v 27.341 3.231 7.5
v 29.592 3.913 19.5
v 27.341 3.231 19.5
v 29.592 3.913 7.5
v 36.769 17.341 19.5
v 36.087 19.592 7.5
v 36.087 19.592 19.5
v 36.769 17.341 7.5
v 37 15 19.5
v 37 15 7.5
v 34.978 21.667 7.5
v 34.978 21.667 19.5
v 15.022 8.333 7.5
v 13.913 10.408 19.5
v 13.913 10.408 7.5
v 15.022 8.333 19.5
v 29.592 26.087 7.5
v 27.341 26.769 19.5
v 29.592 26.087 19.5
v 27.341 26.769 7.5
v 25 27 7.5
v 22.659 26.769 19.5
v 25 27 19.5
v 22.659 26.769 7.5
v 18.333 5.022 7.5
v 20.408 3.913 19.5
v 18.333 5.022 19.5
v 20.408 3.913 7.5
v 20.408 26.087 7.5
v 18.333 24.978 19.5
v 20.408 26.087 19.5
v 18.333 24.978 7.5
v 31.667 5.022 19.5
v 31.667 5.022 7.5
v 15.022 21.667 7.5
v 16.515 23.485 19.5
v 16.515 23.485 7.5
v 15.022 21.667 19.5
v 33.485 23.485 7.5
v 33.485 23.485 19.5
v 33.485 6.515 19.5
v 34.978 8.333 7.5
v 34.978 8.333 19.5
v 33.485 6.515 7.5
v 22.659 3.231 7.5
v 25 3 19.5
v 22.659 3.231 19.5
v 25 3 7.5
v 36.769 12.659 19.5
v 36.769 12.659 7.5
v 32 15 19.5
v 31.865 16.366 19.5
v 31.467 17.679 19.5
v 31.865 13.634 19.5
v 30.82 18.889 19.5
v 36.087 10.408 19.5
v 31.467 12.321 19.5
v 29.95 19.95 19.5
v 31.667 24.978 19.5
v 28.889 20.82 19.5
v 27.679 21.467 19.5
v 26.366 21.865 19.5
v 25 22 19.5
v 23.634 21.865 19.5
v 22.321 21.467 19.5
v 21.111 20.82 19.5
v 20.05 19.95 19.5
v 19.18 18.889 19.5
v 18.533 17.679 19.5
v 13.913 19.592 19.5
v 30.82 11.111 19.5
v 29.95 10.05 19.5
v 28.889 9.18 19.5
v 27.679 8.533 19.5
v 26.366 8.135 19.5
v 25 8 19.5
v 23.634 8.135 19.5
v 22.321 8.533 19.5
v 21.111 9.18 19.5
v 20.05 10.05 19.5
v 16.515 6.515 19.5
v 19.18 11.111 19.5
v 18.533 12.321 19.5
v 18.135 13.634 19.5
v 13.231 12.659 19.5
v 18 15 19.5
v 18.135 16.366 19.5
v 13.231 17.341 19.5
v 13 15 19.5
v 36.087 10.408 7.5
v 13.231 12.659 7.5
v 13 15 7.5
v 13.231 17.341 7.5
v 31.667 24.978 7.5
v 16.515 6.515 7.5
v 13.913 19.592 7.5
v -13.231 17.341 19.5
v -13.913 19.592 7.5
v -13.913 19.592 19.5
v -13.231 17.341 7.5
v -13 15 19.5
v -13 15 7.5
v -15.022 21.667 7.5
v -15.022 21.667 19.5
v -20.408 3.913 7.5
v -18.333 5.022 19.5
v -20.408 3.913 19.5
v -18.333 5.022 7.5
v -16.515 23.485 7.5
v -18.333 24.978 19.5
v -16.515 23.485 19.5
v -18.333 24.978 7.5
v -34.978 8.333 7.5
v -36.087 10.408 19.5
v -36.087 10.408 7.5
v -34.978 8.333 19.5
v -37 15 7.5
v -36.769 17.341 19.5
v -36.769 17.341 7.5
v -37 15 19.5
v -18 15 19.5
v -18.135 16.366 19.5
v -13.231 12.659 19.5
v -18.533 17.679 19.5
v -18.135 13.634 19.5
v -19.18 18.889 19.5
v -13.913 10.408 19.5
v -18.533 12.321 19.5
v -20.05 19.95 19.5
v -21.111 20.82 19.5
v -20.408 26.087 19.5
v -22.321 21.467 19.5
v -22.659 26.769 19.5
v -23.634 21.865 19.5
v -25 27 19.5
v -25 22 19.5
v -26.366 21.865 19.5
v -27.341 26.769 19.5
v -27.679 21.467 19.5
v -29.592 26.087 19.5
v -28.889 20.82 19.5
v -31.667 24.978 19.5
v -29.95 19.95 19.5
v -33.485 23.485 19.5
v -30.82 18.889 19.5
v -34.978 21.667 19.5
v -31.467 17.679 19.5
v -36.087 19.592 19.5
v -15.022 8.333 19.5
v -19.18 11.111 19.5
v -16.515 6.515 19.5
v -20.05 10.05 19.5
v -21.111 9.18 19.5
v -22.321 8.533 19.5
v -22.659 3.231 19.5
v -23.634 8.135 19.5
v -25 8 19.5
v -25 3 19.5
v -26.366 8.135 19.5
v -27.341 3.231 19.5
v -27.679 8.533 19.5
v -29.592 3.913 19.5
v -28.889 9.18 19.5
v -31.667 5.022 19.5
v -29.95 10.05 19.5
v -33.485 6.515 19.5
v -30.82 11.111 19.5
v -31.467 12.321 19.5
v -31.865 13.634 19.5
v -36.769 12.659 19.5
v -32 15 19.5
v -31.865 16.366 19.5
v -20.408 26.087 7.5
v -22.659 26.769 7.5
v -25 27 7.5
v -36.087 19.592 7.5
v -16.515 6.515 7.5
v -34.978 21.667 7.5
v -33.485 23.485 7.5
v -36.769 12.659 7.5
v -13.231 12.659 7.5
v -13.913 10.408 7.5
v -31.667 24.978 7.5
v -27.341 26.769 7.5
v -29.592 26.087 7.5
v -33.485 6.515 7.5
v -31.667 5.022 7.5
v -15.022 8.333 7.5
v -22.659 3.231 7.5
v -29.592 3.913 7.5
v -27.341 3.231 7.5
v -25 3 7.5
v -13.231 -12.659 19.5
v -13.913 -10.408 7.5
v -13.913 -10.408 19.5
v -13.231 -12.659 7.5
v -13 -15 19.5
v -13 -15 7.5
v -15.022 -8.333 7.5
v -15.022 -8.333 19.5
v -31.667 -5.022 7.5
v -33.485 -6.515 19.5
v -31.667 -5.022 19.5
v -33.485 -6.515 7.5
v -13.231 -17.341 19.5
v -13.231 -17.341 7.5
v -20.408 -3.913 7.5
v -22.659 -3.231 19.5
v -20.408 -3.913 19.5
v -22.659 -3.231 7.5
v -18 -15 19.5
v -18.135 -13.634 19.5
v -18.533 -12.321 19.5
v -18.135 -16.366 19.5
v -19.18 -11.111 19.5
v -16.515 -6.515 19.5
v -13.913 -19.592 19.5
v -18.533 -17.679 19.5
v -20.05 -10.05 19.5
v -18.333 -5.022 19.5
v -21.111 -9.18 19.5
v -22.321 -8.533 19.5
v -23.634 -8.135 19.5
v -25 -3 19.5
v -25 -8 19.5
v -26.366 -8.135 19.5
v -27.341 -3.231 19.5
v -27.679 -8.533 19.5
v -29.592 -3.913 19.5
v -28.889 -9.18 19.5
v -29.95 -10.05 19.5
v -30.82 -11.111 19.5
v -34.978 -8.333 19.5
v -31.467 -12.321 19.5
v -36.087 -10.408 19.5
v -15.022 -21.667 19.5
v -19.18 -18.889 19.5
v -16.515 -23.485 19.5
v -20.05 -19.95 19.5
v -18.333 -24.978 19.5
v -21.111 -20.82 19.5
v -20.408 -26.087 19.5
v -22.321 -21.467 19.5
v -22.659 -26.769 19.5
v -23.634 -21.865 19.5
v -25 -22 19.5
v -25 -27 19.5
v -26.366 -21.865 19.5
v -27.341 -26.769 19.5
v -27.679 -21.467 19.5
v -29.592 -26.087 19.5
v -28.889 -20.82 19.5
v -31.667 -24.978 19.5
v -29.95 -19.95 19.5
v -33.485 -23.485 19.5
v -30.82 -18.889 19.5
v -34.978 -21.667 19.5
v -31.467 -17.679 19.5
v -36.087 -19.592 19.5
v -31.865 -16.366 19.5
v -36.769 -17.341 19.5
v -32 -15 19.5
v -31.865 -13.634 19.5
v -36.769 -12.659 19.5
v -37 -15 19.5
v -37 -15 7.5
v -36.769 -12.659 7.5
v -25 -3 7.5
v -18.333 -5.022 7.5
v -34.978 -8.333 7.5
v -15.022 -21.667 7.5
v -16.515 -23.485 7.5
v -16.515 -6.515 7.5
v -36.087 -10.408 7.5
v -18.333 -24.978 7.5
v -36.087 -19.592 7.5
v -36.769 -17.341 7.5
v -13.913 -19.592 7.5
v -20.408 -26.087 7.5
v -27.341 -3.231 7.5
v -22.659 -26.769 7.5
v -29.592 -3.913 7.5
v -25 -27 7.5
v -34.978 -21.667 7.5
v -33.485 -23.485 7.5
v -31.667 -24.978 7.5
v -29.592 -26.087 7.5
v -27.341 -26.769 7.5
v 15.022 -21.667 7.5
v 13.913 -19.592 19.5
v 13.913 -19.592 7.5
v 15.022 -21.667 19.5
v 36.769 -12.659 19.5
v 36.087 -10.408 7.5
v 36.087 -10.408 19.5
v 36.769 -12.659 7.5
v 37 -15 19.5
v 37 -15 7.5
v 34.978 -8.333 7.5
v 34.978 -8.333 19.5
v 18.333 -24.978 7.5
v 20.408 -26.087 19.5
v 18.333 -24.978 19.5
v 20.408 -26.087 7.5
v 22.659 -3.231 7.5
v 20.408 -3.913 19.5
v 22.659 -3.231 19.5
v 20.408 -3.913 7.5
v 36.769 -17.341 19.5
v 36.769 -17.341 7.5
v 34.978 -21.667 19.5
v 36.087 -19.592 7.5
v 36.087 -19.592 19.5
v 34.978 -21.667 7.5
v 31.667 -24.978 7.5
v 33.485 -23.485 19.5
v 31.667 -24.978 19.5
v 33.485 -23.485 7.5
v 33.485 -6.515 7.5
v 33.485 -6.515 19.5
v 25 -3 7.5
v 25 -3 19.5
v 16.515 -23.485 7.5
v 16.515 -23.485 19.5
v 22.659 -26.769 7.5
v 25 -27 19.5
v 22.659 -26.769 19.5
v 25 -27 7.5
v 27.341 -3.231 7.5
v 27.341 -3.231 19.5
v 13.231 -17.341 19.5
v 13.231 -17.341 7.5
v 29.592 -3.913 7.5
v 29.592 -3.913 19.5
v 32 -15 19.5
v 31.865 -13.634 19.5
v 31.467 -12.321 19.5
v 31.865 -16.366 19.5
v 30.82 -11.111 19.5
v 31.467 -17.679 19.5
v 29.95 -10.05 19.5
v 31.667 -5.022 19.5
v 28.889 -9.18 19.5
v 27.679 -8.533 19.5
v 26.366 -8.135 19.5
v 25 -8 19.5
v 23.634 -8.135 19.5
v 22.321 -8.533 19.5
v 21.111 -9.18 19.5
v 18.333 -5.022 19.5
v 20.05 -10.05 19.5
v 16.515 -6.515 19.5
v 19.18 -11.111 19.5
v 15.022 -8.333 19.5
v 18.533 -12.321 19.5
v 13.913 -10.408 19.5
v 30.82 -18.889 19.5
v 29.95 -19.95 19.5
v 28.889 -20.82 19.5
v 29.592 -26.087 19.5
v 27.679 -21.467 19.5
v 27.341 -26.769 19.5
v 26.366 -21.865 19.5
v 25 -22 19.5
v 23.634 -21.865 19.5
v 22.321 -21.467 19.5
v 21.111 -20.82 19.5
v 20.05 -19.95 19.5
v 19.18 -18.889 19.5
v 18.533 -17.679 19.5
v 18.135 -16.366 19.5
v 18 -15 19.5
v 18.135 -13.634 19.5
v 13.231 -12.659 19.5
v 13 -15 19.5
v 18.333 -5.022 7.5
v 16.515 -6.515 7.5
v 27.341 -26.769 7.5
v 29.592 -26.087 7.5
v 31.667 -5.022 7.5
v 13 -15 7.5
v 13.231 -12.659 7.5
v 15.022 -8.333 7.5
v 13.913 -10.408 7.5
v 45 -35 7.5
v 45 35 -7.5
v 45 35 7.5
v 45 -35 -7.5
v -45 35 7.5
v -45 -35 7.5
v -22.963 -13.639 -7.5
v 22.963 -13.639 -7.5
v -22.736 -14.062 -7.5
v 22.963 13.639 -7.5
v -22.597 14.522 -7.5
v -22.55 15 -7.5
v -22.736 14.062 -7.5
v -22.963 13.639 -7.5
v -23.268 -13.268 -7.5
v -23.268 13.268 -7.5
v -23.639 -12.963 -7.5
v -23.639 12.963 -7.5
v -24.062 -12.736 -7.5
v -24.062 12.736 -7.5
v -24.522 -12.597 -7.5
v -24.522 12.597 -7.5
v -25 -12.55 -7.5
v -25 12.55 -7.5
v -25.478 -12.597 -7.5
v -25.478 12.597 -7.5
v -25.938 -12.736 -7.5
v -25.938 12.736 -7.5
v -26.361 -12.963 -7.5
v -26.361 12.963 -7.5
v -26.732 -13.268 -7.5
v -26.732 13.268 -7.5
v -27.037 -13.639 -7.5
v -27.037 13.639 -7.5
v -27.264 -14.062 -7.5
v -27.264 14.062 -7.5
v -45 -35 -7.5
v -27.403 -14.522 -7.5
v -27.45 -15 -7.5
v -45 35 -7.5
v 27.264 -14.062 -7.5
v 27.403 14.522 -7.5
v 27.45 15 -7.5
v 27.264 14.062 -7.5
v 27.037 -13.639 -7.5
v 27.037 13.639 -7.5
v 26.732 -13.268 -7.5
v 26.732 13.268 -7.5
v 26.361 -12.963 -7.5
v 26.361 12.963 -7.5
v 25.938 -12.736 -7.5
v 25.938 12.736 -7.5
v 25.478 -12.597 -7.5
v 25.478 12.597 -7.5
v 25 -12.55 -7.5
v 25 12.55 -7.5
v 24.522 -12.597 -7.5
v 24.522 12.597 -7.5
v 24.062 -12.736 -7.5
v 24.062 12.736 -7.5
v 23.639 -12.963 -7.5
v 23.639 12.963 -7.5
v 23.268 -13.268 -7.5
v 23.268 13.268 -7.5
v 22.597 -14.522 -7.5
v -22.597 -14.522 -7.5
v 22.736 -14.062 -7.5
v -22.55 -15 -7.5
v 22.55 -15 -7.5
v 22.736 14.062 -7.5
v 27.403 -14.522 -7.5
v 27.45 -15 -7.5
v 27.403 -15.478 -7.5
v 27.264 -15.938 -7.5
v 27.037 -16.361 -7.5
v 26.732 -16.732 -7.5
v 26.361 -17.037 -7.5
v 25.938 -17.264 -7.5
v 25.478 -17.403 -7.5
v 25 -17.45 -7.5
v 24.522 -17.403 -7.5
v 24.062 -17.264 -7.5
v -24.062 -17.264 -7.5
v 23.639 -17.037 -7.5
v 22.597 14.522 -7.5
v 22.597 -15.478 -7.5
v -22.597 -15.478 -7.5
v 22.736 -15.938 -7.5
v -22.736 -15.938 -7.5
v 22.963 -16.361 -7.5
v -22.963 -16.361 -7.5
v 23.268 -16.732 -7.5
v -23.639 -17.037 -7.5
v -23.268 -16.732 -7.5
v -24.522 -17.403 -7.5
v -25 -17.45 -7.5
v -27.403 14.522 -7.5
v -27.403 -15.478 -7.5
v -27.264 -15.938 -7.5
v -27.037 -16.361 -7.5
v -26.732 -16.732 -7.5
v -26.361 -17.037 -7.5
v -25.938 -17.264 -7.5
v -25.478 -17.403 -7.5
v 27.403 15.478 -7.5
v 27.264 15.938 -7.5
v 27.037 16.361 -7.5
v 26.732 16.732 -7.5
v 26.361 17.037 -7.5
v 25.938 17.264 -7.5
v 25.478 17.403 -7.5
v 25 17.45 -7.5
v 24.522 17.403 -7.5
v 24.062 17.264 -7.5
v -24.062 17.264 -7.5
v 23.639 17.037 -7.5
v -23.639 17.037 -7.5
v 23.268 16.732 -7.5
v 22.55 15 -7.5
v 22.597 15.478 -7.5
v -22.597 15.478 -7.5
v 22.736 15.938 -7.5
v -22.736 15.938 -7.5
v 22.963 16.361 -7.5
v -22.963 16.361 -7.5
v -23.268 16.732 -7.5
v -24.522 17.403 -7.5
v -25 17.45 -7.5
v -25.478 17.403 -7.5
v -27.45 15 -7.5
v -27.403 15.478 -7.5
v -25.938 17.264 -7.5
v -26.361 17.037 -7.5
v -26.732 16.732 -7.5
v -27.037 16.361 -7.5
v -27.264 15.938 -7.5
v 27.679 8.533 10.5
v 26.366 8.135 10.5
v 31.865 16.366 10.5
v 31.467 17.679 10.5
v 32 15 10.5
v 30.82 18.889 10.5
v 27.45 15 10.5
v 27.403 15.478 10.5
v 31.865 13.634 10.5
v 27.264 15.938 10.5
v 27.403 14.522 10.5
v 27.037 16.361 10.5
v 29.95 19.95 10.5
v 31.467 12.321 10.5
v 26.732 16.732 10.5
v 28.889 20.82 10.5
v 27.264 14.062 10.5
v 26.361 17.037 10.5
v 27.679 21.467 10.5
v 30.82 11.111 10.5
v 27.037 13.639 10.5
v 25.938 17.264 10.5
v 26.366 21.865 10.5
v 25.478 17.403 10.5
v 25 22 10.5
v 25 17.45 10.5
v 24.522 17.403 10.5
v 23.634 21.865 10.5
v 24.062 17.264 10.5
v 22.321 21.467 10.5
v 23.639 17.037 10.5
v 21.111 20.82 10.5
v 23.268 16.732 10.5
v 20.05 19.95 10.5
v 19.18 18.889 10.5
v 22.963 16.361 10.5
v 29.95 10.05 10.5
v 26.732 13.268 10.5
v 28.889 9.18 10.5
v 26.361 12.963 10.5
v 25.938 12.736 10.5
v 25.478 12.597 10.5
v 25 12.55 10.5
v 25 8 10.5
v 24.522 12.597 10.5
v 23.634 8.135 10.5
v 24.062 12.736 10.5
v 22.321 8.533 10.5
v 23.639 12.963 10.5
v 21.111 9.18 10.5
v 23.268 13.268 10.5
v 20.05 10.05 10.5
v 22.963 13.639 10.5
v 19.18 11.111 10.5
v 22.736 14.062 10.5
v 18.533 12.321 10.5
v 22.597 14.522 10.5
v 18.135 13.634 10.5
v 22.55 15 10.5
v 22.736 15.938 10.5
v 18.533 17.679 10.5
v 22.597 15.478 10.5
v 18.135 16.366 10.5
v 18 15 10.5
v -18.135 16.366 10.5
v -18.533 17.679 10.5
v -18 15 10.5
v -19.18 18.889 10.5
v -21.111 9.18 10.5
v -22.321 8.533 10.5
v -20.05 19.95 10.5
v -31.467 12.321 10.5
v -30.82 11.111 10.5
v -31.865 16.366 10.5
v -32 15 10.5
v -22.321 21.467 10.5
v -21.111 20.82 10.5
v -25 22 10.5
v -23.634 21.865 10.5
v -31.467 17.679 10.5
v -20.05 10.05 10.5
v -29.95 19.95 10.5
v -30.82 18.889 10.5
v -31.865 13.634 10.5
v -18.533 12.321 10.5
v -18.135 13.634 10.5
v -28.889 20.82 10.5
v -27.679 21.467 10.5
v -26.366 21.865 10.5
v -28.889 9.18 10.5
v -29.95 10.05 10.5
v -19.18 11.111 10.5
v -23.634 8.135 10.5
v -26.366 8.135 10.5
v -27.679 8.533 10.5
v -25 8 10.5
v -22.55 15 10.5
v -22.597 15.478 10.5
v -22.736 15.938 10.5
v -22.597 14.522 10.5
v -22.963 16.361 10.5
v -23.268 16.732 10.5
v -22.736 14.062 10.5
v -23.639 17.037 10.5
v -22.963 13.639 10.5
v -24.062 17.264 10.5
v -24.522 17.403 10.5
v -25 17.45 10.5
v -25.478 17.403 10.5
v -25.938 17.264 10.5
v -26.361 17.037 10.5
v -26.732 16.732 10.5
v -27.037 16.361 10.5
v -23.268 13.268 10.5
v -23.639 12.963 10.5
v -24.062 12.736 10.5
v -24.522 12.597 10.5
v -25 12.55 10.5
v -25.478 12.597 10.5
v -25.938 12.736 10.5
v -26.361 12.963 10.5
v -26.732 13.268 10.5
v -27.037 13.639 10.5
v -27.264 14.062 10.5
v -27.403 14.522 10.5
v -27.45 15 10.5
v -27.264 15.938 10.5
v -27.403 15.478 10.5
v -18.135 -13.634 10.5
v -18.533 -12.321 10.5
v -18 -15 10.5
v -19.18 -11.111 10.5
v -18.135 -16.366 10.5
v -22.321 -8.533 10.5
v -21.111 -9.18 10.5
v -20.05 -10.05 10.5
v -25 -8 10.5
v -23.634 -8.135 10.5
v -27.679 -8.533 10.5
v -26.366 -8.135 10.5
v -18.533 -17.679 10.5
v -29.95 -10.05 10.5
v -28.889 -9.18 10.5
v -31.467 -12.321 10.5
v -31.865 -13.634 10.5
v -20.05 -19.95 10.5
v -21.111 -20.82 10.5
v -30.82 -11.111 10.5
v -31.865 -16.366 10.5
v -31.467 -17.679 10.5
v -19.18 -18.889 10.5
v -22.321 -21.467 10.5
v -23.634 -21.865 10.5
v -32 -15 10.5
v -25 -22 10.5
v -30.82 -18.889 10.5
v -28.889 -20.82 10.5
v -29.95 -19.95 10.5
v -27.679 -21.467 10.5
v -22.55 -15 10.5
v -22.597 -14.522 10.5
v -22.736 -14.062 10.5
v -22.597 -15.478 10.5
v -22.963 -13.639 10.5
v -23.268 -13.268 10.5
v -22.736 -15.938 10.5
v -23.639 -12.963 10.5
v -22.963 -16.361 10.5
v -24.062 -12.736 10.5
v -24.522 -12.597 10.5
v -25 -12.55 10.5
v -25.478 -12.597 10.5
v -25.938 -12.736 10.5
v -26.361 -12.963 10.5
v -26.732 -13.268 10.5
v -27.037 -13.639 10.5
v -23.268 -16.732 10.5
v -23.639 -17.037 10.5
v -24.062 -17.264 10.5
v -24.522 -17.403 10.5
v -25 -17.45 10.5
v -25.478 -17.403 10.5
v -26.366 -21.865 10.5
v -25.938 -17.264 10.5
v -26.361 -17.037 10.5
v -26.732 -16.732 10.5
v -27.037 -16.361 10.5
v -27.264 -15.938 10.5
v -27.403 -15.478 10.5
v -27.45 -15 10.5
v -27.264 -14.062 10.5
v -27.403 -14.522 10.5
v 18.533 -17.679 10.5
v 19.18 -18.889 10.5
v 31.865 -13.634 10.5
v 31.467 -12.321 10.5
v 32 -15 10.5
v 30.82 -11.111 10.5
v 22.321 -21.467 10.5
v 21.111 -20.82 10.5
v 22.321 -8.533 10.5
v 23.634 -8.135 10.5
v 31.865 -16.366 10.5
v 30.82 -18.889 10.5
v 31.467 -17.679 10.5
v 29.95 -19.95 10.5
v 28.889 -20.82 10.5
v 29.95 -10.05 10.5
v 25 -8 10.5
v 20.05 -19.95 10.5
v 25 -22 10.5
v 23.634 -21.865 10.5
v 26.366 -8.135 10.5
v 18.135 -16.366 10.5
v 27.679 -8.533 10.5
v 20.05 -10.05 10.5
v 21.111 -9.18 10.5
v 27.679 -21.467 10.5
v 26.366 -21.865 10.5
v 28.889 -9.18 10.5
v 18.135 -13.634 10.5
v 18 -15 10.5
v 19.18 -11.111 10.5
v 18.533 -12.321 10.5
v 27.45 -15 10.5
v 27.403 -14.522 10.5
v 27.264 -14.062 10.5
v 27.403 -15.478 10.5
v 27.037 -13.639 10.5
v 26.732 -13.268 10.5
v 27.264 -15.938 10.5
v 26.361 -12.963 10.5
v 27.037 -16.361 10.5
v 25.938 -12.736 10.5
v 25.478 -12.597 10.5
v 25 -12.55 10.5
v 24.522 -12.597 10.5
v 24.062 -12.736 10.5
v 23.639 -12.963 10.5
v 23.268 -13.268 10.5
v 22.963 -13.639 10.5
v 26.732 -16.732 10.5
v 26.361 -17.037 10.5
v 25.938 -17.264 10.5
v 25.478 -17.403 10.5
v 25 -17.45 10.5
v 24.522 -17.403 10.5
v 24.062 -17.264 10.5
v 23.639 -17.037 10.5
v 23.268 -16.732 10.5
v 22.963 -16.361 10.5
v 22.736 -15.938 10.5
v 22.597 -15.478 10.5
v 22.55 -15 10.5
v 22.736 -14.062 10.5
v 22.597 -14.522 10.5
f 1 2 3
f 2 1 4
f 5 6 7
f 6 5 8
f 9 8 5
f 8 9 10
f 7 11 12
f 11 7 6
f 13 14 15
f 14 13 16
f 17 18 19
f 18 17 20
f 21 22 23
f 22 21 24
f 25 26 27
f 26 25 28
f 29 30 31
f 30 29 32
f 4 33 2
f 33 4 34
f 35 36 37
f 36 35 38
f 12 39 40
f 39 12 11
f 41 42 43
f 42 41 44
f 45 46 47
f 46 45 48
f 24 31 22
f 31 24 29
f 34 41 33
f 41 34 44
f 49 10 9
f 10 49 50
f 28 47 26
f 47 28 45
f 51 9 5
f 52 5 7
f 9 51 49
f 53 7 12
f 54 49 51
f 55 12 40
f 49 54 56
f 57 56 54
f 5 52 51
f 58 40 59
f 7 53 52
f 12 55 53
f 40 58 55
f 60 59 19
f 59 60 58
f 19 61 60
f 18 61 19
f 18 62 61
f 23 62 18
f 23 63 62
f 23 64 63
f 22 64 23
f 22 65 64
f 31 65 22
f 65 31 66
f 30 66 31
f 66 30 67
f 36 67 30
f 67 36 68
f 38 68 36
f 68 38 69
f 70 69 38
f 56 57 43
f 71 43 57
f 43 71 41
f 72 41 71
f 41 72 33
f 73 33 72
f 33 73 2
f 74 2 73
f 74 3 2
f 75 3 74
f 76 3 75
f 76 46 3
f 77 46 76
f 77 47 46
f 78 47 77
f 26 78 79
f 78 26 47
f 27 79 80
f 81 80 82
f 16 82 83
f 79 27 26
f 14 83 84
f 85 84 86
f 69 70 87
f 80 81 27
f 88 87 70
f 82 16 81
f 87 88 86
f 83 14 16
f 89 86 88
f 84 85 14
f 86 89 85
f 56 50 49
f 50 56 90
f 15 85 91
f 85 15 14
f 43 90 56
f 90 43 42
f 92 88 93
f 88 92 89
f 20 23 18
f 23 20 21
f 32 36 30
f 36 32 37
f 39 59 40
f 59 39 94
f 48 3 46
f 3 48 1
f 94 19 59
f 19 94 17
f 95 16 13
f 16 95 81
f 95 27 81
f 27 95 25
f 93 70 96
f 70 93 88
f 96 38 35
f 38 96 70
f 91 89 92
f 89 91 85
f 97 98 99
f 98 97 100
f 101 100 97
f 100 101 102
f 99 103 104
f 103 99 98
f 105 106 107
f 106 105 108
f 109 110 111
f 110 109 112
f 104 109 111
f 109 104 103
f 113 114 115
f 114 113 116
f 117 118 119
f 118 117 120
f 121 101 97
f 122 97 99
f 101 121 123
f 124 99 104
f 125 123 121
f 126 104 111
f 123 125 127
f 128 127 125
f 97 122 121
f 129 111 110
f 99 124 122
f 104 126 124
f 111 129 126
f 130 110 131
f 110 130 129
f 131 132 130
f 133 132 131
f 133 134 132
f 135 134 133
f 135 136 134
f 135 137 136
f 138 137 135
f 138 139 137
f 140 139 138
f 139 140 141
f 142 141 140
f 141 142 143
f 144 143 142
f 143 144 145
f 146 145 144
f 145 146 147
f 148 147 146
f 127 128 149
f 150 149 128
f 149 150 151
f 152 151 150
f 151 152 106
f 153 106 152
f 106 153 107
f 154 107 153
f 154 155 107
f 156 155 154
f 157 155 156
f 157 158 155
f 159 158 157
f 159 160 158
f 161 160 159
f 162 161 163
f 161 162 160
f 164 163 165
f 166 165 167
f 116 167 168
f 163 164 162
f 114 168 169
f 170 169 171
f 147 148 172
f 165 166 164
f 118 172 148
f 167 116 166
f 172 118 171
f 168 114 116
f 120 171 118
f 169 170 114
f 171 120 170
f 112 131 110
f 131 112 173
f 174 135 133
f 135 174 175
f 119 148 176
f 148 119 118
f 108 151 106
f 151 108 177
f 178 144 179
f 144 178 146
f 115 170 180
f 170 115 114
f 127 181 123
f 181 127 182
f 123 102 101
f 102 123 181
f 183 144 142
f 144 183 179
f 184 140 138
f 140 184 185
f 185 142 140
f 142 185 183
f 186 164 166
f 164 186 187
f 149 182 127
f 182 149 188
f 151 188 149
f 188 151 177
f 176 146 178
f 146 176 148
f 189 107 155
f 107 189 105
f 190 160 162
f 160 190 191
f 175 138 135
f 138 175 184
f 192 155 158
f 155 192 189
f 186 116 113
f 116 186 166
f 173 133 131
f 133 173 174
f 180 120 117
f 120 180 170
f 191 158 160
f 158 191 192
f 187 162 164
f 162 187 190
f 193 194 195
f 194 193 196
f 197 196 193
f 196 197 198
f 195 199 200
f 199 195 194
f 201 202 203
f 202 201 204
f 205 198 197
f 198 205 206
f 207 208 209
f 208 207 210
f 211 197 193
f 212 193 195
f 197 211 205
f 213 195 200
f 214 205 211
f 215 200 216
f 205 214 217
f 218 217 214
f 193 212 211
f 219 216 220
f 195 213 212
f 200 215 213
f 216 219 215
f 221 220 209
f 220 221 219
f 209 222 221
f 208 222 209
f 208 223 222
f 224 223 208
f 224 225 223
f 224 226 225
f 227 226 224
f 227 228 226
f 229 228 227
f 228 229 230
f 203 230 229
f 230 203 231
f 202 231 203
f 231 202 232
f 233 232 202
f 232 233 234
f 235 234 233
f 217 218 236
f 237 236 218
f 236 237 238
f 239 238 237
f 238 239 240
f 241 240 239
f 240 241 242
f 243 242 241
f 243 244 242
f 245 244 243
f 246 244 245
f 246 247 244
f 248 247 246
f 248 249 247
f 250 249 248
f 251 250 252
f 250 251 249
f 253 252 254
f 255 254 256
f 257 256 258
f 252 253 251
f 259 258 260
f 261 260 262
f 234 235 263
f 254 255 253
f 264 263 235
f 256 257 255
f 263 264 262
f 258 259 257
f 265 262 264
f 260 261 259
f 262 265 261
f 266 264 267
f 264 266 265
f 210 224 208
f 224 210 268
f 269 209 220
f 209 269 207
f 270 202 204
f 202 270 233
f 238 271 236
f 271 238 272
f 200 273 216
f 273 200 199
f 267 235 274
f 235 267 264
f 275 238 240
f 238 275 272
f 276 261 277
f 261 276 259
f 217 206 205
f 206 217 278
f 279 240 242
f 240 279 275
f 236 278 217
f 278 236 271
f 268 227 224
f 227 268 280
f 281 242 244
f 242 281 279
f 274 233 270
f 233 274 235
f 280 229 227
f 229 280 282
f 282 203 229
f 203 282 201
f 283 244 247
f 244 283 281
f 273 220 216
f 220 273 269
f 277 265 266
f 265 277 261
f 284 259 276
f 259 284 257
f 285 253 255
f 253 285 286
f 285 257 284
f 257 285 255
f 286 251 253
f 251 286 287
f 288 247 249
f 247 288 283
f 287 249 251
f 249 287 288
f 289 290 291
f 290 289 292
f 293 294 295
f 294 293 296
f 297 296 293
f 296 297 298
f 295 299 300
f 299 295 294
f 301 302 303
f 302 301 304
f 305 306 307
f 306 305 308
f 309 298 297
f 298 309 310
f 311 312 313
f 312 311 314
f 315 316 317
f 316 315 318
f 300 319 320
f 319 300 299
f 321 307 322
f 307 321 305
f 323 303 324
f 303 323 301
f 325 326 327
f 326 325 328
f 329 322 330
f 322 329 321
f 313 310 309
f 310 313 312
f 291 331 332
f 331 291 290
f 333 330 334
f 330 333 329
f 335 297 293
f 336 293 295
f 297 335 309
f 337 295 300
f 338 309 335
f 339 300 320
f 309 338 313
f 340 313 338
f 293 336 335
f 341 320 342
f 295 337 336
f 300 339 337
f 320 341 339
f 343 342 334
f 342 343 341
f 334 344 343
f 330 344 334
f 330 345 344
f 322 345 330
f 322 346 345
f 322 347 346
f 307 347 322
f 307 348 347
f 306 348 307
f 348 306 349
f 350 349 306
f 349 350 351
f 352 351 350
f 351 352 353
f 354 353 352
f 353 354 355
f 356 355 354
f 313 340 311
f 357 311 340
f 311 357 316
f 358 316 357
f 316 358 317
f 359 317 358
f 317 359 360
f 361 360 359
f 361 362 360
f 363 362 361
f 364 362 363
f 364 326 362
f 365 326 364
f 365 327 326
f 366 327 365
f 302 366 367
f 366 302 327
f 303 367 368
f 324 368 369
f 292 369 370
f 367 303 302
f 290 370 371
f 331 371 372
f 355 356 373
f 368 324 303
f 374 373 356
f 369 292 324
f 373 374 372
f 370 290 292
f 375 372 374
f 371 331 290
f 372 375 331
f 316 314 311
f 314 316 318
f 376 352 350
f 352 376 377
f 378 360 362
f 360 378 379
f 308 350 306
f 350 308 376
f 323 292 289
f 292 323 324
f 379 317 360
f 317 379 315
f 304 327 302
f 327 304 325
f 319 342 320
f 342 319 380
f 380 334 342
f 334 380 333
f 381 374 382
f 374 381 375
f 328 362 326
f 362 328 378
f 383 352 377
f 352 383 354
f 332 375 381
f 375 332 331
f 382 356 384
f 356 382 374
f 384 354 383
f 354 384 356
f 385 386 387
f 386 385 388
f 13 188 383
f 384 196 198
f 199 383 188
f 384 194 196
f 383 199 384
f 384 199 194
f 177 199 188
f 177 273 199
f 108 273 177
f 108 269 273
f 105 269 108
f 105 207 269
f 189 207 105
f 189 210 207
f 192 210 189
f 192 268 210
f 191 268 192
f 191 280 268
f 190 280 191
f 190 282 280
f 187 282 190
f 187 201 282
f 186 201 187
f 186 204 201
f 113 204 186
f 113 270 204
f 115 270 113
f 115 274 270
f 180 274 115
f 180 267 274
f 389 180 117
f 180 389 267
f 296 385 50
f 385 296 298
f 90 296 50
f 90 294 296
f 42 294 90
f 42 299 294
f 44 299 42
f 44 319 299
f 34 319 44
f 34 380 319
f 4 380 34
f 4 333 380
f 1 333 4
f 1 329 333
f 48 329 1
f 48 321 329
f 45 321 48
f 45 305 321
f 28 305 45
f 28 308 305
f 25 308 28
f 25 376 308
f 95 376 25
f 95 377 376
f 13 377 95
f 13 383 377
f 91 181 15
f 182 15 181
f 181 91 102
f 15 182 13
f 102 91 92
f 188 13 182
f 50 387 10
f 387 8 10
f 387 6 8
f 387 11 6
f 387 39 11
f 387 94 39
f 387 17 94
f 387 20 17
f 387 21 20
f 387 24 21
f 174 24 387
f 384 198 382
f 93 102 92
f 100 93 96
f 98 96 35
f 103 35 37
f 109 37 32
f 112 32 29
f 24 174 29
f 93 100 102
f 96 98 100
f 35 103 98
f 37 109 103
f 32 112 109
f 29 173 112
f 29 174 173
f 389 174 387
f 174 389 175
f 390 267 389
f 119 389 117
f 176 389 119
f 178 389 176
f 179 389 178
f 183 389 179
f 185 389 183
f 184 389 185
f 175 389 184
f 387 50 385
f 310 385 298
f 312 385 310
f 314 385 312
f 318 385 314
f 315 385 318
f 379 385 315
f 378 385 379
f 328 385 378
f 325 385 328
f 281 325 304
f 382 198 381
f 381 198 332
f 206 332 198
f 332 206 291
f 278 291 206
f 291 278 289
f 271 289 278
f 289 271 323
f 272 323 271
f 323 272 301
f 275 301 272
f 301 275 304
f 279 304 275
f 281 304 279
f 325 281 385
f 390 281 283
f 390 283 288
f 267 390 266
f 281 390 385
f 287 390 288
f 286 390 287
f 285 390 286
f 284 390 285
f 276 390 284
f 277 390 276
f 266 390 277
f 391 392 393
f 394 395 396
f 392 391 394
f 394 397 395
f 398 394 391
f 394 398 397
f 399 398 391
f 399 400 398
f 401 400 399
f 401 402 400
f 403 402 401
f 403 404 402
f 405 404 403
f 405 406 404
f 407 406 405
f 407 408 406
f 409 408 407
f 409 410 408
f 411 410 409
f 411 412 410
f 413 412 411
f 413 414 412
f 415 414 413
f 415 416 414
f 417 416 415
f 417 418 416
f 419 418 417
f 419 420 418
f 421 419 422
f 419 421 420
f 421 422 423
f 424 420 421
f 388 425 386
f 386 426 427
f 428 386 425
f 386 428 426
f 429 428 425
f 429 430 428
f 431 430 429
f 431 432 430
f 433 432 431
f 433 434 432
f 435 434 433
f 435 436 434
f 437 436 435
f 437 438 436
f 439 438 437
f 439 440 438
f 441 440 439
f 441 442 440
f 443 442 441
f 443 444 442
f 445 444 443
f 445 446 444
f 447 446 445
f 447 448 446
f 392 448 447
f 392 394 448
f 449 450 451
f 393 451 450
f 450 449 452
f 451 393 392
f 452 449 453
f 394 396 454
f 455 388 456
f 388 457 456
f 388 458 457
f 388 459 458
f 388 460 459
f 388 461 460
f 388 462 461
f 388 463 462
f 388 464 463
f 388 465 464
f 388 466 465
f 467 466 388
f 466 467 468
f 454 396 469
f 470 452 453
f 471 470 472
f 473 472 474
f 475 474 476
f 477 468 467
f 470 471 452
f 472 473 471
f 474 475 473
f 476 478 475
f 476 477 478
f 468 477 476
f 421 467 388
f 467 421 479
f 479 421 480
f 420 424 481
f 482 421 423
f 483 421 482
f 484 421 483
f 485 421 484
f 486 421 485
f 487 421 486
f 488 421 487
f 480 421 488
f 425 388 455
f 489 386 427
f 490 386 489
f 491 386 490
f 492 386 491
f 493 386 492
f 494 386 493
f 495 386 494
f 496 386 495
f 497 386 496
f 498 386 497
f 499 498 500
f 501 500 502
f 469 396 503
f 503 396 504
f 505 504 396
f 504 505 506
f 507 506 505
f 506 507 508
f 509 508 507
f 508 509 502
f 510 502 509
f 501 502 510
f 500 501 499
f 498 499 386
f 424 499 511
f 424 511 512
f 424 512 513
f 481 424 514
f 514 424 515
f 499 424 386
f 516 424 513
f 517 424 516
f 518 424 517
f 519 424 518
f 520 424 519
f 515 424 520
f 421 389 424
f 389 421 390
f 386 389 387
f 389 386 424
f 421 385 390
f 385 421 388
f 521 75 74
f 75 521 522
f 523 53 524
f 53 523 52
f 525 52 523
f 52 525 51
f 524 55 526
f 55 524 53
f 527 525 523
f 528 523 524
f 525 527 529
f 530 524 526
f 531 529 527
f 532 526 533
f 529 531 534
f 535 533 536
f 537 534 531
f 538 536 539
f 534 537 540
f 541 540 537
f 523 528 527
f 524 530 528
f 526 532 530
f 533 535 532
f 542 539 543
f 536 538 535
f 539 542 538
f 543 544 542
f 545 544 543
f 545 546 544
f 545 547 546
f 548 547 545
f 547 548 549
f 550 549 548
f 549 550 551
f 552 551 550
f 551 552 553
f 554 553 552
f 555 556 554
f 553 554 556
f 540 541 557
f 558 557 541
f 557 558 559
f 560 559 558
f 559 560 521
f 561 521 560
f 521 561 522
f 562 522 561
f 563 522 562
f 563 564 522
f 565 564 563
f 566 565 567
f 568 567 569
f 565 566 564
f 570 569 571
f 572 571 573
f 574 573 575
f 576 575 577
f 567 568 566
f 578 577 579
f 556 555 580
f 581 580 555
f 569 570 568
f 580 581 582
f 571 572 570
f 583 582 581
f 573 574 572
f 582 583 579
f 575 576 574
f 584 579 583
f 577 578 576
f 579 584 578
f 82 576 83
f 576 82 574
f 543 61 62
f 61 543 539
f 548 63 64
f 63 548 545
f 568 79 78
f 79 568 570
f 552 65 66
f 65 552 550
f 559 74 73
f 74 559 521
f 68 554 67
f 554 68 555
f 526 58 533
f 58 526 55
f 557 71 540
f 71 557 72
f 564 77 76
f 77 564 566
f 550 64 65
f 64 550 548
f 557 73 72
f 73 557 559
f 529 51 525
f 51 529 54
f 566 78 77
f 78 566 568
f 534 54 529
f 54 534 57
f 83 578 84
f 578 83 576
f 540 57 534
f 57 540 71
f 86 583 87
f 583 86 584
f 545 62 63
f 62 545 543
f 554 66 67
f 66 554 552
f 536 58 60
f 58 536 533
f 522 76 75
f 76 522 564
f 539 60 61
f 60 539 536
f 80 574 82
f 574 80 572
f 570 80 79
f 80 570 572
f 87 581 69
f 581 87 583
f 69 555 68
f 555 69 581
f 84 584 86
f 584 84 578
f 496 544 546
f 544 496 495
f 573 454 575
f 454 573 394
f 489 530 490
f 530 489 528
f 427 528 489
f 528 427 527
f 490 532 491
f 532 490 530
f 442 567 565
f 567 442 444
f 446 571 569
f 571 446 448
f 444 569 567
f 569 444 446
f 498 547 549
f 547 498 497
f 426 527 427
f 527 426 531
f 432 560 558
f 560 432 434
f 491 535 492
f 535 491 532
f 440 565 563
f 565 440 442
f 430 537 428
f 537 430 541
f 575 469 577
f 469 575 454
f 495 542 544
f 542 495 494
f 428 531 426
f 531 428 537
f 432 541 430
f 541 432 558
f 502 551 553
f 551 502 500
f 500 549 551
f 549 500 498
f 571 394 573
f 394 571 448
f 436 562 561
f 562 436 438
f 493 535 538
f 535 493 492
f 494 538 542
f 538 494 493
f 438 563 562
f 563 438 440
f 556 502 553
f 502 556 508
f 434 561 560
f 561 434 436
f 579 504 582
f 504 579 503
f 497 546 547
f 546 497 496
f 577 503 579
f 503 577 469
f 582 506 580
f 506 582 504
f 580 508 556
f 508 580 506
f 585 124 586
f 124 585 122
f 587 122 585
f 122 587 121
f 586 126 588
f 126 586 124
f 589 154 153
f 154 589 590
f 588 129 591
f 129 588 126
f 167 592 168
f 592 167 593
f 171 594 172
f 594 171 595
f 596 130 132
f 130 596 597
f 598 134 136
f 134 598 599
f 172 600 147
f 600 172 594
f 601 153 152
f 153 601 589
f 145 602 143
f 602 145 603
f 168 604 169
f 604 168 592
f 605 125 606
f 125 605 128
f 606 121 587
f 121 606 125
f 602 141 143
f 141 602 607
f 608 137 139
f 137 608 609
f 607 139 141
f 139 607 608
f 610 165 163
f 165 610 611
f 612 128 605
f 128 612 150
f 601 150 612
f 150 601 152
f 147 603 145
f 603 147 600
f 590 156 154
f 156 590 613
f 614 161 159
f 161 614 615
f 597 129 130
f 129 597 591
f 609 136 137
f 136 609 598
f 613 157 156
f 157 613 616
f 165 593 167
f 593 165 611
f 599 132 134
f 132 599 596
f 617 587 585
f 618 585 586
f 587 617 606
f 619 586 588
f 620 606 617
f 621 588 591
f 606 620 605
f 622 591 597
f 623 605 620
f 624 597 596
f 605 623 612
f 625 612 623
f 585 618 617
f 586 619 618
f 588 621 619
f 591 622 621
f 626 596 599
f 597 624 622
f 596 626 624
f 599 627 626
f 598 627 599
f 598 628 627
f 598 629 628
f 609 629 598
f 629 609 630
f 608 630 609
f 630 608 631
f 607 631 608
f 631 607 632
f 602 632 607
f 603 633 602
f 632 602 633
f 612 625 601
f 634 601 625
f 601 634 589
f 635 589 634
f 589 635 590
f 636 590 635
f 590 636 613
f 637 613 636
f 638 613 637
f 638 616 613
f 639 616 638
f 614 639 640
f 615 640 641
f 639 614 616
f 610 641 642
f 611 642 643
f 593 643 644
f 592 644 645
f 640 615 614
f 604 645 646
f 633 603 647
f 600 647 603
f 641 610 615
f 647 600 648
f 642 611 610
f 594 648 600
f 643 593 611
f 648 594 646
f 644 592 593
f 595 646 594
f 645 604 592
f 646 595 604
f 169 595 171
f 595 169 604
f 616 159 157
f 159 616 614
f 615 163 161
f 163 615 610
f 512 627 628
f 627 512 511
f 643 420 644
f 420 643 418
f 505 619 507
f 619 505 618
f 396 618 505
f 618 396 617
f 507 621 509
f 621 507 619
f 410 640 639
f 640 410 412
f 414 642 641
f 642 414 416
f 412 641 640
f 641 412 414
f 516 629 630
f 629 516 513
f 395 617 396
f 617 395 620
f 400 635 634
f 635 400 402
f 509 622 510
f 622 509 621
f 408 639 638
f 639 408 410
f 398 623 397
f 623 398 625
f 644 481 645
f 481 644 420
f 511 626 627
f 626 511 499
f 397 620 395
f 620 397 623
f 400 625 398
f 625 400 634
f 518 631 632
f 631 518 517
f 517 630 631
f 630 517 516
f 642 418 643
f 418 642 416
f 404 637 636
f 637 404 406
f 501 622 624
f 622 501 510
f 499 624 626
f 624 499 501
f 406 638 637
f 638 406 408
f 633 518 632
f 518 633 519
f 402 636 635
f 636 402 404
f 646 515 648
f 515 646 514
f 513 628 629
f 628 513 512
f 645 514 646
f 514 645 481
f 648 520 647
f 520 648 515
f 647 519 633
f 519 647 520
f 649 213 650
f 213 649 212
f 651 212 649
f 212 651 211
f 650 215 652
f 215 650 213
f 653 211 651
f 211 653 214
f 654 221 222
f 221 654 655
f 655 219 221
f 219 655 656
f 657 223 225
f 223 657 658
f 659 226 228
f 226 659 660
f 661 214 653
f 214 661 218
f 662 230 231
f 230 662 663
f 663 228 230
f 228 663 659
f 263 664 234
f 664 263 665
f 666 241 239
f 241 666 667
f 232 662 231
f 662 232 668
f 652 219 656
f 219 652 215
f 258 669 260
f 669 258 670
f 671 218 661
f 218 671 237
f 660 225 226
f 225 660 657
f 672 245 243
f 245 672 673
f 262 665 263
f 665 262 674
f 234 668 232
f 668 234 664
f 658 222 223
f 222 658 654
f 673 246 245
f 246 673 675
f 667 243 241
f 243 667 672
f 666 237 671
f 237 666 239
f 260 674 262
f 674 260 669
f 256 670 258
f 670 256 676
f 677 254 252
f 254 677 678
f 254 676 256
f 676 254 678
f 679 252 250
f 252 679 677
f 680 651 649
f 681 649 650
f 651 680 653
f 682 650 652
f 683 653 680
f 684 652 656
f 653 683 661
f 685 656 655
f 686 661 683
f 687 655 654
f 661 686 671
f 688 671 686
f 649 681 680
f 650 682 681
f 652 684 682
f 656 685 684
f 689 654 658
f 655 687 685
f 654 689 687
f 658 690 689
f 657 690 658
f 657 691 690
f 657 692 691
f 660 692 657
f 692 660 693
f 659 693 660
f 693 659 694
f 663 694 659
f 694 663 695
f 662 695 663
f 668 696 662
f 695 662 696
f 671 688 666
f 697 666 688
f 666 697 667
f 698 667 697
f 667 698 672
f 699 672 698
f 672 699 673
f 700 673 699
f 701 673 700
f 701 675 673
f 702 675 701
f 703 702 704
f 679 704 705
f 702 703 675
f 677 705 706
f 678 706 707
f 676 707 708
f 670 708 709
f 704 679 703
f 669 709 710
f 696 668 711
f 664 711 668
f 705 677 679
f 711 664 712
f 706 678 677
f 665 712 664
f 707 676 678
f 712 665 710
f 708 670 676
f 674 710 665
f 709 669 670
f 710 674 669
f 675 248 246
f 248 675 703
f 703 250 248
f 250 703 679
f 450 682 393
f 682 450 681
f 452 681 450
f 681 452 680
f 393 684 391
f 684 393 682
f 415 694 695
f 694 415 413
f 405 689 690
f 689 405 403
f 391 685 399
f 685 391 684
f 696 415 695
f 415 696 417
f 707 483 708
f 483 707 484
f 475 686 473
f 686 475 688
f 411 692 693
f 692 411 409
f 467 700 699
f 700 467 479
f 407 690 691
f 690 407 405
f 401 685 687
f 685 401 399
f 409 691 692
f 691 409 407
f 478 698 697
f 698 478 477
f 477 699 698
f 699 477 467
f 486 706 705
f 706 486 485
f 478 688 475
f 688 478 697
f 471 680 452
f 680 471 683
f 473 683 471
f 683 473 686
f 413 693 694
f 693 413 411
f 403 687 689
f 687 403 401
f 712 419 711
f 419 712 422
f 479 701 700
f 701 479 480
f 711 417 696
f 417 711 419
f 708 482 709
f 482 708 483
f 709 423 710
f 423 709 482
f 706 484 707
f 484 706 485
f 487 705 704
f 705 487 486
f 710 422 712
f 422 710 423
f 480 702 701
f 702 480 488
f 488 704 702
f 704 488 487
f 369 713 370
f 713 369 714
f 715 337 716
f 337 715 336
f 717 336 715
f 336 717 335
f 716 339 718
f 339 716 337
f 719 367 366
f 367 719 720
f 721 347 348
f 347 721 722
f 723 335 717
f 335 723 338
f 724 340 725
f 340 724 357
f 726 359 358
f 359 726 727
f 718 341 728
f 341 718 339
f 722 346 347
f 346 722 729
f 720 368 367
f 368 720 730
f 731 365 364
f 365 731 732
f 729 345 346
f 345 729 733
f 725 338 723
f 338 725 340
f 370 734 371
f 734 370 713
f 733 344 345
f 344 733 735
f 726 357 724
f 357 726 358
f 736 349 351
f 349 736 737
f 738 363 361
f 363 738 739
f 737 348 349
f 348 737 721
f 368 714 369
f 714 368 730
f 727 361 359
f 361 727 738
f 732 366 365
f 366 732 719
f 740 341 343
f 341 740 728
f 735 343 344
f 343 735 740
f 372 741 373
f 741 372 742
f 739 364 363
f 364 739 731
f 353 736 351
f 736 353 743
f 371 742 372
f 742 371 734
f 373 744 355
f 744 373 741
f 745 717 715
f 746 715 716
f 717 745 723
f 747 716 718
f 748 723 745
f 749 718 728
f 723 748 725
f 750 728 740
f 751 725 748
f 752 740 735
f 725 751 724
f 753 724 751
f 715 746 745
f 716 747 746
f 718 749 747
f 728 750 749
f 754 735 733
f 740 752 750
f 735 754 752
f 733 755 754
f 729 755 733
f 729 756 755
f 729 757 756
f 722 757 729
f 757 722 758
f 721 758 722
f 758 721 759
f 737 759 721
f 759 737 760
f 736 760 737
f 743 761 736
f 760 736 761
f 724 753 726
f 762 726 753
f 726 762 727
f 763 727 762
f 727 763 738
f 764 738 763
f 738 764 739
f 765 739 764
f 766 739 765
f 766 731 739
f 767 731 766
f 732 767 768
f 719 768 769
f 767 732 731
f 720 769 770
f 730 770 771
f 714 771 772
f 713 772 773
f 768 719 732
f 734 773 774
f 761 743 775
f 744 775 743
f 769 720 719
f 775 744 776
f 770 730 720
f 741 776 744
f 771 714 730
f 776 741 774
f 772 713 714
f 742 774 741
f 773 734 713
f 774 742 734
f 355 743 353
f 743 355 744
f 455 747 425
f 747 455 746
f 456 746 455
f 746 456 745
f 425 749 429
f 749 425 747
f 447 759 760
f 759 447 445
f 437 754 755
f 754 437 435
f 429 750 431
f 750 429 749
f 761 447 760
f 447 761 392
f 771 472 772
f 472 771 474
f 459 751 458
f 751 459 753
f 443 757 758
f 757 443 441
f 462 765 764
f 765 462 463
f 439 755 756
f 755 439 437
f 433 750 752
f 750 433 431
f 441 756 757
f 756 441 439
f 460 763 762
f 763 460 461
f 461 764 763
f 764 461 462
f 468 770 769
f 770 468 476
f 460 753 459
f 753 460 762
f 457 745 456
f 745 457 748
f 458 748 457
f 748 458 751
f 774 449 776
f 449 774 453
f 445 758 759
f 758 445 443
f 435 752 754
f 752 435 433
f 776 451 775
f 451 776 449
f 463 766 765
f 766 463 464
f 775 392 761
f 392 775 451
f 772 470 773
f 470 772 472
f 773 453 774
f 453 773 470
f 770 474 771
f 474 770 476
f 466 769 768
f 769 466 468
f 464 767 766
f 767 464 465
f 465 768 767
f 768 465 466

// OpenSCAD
$fn = 32;

// ----------------------------------------------------------------------
// Socket pad plate
// bosses with counterbored sockets for the screws
// ----------------------------------------------------------------------

// --- parameters (mm) ---
base_t = 15;           // base plate thickness
boss_h = 12;           // boss height above the base plate
boss_d = 24;           // boss diameter
socket_d = 14;         // socket diameter
socket_depth = 9;      // socket depth from the boss face
bolt_d = 4.9;          // screw clearance hole through the socket floor
plate = [90, 70, 15];  // overall size (x, y, z)
edge = 20;             // boss centre offset from the plate edge
pads = 4;              // boss count, one per corner

// --- derived feature positions (mm) ---
height = base_t + boss_h;        // = 27   overall height of the part
corner_x = plate[0] / 2 - edge;  // = 25   boss centre X
corner_y = plate[1] / 2 - edge;  // = 15   boss centre Y
feature_centers = [
  [corner_x, corner_y],
  [-corner_x, corner_y],
  [-corner_x, -corner_y],
  [corner_x, -corner_y]
];   // boss centres: sockets, holes and the pads themselves are placed from here

// base plate, bosses on feature_centers, socket + through hole in each
difference() {
  union() {
    cube(plate, center = true);
    for (centre = feature_centers)
      translate([centre[0], centre[1], plate[2] / 2 - 1])
        cylinder(d = boss_d, h = boss_h + 1);
  }
  for (centre = feature_centers) {
    translate([centre[0], centre[1], plate[2] / 2 + boss_h - socket_depth])
      cylinder(d = socket_d, h = socket_depth + 1);
    translate([centre[0], centre[1], -height])
      cylinder(d = bolt_d, h = 2 * height + 2);  // through the socket floor
  }
}
